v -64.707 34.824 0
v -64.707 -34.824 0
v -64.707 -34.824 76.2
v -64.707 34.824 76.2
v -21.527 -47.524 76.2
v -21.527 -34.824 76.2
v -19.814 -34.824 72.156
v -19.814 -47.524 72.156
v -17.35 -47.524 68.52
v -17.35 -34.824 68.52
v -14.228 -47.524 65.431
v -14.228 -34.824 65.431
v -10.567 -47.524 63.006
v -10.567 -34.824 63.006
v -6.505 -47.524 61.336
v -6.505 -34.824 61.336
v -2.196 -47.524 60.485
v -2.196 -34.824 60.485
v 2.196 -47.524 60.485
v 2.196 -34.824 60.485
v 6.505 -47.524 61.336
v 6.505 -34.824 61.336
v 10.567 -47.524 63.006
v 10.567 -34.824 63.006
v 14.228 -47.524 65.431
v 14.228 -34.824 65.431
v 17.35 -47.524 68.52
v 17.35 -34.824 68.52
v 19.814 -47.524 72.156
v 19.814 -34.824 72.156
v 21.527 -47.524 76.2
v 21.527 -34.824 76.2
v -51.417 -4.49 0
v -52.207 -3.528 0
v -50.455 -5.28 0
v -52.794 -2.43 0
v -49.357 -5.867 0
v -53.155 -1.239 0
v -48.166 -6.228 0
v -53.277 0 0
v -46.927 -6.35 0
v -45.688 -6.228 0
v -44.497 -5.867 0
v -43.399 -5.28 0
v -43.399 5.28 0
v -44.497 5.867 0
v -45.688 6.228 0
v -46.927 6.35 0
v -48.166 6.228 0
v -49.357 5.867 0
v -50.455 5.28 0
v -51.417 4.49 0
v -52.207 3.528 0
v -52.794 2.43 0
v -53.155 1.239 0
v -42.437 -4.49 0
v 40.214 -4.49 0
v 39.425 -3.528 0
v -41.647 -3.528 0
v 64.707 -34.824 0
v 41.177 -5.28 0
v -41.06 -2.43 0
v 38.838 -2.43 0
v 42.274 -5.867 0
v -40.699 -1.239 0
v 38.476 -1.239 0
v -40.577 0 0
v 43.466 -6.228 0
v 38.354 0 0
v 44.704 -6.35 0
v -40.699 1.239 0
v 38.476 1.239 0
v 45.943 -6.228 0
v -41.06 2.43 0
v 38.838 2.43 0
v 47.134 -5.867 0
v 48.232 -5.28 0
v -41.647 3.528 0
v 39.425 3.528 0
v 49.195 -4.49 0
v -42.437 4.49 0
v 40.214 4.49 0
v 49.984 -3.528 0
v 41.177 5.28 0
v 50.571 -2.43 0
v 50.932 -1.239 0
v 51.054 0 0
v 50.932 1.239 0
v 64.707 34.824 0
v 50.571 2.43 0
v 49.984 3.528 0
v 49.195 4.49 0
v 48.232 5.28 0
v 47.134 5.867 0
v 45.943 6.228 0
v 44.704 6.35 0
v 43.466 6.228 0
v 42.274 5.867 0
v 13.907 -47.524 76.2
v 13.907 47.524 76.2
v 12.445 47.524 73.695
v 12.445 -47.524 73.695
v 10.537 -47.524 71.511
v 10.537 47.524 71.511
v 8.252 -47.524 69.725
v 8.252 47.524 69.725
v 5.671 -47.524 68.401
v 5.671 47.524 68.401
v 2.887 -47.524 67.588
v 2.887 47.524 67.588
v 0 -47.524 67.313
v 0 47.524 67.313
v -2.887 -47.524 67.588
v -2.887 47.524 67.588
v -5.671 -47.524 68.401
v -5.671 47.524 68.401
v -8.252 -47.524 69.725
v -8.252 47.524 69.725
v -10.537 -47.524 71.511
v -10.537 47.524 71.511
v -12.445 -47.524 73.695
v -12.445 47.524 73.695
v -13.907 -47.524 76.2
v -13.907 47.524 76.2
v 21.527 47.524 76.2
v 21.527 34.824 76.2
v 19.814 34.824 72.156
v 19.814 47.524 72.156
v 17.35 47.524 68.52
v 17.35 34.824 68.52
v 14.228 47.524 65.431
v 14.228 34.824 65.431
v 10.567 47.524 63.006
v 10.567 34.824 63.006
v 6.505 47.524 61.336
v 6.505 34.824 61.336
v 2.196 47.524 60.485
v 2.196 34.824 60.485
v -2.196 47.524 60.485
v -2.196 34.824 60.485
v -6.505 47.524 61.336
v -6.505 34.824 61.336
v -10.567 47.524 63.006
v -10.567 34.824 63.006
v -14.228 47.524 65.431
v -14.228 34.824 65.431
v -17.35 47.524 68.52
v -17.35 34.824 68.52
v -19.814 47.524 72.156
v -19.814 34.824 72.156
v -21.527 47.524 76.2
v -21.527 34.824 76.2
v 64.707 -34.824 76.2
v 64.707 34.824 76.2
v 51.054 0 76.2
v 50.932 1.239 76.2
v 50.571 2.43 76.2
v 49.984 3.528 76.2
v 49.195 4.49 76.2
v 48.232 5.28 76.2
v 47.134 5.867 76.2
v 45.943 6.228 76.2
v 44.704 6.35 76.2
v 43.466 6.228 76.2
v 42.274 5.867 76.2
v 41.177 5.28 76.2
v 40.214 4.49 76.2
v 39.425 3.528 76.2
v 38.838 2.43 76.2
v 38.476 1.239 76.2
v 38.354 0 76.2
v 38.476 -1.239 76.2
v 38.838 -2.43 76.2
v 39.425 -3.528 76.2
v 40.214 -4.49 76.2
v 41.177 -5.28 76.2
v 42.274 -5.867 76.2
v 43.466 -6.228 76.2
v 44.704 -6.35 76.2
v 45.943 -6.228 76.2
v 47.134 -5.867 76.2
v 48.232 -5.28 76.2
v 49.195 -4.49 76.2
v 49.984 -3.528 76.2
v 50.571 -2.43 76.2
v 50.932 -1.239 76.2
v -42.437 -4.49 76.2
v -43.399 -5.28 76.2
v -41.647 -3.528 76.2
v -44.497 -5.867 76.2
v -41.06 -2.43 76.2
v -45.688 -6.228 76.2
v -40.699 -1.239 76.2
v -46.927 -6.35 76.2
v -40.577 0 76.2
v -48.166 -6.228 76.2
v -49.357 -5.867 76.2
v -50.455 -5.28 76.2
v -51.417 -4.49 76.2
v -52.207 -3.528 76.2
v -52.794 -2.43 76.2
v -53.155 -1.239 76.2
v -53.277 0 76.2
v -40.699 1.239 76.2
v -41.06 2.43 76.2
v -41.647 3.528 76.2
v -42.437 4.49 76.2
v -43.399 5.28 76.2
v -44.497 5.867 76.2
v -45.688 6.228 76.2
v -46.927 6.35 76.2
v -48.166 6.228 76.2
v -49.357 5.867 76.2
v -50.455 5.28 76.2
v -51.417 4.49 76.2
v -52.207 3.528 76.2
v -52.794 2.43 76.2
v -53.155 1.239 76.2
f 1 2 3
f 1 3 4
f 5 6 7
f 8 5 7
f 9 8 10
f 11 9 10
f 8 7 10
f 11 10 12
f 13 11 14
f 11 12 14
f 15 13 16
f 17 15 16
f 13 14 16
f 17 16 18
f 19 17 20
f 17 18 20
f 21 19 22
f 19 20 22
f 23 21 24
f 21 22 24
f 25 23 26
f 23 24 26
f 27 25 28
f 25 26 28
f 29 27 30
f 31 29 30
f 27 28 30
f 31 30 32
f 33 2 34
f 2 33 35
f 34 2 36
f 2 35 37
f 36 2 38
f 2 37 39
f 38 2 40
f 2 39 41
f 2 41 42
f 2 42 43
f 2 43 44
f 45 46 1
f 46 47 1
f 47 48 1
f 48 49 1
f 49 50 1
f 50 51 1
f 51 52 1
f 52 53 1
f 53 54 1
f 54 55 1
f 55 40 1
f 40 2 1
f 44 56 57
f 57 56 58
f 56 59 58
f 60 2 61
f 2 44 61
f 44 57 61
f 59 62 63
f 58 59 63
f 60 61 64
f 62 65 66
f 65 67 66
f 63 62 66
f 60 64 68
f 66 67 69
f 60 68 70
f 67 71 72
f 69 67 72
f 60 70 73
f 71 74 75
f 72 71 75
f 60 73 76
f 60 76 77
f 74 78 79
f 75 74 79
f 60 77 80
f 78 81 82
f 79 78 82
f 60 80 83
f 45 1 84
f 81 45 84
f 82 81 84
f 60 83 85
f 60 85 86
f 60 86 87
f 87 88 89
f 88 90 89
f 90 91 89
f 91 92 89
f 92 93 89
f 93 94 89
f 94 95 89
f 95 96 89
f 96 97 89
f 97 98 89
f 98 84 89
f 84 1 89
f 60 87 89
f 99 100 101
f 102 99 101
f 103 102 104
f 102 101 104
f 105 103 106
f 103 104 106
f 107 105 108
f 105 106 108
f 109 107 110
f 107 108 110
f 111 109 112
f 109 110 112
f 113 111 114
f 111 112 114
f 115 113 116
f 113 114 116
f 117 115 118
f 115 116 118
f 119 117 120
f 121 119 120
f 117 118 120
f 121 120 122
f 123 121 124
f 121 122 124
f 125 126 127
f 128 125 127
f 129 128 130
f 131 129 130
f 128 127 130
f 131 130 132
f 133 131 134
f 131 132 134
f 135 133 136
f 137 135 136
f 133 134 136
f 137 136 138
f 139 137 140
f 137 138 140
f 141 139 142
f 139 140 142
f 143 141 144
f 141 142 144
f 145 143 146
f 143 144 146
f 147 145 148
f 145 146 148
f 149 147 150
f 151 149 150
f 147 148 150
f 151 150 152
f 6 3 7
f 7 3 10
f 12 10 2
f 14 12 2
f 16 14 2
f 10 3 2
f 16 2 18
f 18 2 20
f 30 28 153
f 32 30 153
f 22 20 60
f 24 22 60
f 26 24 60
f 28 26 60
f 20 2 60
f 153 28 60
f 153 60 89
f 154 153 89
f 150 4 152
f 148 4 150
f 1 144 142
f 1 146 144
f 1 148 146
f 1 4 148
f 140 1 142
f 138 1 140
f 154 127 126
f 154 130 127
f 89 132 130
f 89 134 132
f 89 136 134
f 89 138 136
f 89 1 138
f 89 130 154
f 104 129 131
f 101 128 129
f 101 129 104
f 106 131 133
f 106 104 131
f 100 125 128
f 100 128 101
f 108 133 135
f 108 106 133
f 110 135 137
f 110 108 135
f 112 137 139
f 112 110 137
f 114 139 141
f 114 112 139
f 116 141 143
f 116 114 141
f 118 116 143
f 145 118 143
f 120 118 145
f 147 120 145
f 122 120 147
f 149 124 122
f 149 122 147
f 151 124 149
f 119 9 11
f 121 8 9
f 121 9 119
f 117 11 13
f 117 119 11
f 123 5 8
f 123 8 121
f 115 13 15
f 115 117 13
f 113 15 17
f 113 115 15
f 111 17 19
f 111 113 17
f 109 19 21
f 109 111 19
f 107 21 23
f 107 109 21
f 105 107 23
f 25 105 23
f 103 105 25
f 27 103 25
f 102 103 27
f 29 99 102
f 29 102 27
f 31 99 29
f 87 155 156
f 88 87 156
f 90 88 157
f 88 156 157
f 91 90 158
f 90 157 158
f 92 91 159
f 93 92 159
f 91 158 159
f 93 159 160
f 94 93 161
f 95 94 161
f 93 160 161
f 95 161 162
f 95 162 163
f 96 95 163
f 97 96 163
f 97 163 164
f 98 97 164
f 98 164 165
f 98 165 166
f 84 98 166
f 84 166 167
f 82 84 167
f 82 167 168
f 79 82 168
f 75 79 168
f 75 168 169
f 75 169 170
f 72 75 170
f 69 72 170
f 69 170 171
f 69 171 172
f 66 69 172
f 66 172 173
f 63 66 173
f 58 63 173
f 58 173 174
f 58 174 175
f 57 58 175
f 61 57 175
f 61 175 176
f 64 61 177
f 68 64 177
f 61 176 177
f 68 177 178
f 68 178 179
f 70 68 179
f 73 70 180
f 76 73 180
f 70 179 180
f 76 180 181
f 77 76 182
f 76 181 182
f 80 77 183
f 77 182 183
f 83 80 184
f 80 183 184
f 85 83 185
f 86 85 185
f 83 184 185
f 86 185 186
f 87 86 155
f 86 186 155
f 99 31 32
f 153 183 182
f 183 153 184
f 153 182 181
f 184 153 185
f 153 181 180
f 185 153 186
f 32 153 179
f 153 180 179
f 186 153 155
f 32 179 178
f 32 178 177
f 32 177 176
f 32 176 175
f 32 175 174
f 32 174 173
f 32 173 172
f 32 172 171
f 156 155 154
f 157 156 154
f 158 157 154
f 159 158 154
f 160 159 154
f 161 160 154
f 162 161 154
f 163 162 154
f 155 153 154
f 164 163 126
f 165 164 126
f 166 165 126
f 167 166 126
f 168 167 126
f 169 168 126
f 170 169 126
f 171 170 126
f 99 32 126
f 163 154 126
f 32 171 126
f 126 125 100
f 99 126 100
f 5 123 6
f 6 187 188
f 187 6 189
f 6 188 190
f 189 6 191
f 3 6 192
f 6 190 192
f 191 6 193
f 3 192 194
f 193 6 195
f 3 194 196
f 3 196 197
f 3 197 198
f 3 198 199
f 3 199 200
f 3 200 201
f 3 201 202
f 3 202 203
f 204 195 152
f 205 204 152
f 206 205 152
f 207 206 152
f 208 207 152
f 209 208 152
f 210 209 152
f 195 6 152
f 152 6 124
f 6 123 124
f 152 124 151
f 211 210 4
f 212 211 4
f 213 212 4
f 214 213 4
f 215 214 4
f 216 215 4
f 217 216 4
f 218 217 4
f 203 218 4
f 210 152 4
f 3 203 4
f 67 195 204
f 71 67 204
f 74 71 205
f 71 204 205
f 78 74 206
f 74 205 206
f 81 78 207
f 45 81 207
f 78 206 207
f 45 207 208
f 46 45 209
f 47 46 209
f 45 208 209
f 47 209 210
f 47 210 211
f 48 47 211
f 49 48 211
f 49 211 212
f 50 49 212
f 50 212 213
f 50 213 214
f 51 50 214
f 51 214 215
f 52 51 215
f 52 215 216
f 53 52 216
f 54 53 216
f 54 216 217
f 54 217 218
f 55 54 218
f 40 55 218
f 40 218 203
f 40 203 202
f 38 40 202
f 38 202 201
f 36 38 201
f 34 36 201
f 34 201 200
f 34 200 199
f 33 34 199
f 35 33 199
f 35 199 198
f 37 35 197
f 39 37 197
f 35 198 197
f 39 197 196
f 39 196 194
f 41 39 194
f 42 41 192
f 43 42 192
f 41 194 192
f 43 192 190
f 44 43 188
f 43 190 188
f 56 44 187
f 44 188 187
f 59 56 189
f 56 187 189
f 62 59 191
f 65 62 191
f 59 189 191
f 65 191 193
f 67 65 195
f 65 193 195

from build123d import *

# Parameters (mm, degrees)
F0_W     = 129.4137537479
F0_H     = 69.6472600102
F1_DEPTH = 76.2
F3_DEPTH = 12.7
F4_DEPTH = 127
F6_DEPTH = 12.7
F7_R     = 6.35
F8_DEPTH = 127


with BuildPart() as f1:
    # F0 (on Top) → F1 (new body)
    with BuildSketch(Plane.XY):
        Rectangle(F0_W, F0_H)
    extrude(amount=F1_DEPTH)

    # F2 (on face) → F3 (join)
    with BuildSketch(Plane(origin=(0, 34.8236300051, 0), x_dir=(-1, 0, 0), z_dir=(0, 1, 0))):
        with BuildLine():
            Line((-13.906876874, 76.2), (-21.526876874, 76.2))
            ThreePointArc((-21.526876874, 76.2), (0, 60.3776017268), (21.526876874, 76.2))
            Line((21.526876874, 76.2), (13.906876874, 76.2))
            ThreePointArc((13.906876874, 76.2), (0, 67.3132582233), (-13.906876874, 76.2))
        make_face()
    extrude(amount=F3_DEPTH)

    # F2 (on face) → F4 (cut)
    with BuildSketch(Plane(origin=(0, 34.8236300051, 0), x_dir=(-1, 0, 0), z_dir=(0, 1, 0))):
        with BuildLine():
            Line((13.906876874, 76.2), (-13.906876874, 76.2))
            ThreePointArc((-13.906876874, 76.2), (0, 67.3132582233), (13.906876874, 76.2))
        make_face()
    extrude(amount=-F4_DEPTH, mode=Mode.SUBTRACT)

    # F5 (on face) → F6 (join)
    with BuildSketch(Plane.XZ.offset(34.8236300051)):
        with BuildLine():
            Line((-13.906876874, 76.2), (-21.526876874, 76.2))
            ThreePointArc((-21.526876874, 76.2), (0, 60.3776017268), (21.526876874, 76.2))
            Line((21.526876874, 76.2), (13.906876874, 76.2))
            ThreePointArc((13.906876874, 76.2), (0, 67.3132582233), (-13.906876874, 76.2))
        make_face()
    extrude(amount=F6_DEPTH)

    # F7 (on face) → F8 (cut)
    with BuildSketch(Plane.XY.offset(76.2)):
        with Locations((-46.926876874, 0)):
            Circle(F7_R)
        with Locations((44.7043851018, 0)):
            Circle(F7_R)
    extrude(amount=-F8_DEPTH, mode=Mode.SUBTRACT)


solid = f1.part
